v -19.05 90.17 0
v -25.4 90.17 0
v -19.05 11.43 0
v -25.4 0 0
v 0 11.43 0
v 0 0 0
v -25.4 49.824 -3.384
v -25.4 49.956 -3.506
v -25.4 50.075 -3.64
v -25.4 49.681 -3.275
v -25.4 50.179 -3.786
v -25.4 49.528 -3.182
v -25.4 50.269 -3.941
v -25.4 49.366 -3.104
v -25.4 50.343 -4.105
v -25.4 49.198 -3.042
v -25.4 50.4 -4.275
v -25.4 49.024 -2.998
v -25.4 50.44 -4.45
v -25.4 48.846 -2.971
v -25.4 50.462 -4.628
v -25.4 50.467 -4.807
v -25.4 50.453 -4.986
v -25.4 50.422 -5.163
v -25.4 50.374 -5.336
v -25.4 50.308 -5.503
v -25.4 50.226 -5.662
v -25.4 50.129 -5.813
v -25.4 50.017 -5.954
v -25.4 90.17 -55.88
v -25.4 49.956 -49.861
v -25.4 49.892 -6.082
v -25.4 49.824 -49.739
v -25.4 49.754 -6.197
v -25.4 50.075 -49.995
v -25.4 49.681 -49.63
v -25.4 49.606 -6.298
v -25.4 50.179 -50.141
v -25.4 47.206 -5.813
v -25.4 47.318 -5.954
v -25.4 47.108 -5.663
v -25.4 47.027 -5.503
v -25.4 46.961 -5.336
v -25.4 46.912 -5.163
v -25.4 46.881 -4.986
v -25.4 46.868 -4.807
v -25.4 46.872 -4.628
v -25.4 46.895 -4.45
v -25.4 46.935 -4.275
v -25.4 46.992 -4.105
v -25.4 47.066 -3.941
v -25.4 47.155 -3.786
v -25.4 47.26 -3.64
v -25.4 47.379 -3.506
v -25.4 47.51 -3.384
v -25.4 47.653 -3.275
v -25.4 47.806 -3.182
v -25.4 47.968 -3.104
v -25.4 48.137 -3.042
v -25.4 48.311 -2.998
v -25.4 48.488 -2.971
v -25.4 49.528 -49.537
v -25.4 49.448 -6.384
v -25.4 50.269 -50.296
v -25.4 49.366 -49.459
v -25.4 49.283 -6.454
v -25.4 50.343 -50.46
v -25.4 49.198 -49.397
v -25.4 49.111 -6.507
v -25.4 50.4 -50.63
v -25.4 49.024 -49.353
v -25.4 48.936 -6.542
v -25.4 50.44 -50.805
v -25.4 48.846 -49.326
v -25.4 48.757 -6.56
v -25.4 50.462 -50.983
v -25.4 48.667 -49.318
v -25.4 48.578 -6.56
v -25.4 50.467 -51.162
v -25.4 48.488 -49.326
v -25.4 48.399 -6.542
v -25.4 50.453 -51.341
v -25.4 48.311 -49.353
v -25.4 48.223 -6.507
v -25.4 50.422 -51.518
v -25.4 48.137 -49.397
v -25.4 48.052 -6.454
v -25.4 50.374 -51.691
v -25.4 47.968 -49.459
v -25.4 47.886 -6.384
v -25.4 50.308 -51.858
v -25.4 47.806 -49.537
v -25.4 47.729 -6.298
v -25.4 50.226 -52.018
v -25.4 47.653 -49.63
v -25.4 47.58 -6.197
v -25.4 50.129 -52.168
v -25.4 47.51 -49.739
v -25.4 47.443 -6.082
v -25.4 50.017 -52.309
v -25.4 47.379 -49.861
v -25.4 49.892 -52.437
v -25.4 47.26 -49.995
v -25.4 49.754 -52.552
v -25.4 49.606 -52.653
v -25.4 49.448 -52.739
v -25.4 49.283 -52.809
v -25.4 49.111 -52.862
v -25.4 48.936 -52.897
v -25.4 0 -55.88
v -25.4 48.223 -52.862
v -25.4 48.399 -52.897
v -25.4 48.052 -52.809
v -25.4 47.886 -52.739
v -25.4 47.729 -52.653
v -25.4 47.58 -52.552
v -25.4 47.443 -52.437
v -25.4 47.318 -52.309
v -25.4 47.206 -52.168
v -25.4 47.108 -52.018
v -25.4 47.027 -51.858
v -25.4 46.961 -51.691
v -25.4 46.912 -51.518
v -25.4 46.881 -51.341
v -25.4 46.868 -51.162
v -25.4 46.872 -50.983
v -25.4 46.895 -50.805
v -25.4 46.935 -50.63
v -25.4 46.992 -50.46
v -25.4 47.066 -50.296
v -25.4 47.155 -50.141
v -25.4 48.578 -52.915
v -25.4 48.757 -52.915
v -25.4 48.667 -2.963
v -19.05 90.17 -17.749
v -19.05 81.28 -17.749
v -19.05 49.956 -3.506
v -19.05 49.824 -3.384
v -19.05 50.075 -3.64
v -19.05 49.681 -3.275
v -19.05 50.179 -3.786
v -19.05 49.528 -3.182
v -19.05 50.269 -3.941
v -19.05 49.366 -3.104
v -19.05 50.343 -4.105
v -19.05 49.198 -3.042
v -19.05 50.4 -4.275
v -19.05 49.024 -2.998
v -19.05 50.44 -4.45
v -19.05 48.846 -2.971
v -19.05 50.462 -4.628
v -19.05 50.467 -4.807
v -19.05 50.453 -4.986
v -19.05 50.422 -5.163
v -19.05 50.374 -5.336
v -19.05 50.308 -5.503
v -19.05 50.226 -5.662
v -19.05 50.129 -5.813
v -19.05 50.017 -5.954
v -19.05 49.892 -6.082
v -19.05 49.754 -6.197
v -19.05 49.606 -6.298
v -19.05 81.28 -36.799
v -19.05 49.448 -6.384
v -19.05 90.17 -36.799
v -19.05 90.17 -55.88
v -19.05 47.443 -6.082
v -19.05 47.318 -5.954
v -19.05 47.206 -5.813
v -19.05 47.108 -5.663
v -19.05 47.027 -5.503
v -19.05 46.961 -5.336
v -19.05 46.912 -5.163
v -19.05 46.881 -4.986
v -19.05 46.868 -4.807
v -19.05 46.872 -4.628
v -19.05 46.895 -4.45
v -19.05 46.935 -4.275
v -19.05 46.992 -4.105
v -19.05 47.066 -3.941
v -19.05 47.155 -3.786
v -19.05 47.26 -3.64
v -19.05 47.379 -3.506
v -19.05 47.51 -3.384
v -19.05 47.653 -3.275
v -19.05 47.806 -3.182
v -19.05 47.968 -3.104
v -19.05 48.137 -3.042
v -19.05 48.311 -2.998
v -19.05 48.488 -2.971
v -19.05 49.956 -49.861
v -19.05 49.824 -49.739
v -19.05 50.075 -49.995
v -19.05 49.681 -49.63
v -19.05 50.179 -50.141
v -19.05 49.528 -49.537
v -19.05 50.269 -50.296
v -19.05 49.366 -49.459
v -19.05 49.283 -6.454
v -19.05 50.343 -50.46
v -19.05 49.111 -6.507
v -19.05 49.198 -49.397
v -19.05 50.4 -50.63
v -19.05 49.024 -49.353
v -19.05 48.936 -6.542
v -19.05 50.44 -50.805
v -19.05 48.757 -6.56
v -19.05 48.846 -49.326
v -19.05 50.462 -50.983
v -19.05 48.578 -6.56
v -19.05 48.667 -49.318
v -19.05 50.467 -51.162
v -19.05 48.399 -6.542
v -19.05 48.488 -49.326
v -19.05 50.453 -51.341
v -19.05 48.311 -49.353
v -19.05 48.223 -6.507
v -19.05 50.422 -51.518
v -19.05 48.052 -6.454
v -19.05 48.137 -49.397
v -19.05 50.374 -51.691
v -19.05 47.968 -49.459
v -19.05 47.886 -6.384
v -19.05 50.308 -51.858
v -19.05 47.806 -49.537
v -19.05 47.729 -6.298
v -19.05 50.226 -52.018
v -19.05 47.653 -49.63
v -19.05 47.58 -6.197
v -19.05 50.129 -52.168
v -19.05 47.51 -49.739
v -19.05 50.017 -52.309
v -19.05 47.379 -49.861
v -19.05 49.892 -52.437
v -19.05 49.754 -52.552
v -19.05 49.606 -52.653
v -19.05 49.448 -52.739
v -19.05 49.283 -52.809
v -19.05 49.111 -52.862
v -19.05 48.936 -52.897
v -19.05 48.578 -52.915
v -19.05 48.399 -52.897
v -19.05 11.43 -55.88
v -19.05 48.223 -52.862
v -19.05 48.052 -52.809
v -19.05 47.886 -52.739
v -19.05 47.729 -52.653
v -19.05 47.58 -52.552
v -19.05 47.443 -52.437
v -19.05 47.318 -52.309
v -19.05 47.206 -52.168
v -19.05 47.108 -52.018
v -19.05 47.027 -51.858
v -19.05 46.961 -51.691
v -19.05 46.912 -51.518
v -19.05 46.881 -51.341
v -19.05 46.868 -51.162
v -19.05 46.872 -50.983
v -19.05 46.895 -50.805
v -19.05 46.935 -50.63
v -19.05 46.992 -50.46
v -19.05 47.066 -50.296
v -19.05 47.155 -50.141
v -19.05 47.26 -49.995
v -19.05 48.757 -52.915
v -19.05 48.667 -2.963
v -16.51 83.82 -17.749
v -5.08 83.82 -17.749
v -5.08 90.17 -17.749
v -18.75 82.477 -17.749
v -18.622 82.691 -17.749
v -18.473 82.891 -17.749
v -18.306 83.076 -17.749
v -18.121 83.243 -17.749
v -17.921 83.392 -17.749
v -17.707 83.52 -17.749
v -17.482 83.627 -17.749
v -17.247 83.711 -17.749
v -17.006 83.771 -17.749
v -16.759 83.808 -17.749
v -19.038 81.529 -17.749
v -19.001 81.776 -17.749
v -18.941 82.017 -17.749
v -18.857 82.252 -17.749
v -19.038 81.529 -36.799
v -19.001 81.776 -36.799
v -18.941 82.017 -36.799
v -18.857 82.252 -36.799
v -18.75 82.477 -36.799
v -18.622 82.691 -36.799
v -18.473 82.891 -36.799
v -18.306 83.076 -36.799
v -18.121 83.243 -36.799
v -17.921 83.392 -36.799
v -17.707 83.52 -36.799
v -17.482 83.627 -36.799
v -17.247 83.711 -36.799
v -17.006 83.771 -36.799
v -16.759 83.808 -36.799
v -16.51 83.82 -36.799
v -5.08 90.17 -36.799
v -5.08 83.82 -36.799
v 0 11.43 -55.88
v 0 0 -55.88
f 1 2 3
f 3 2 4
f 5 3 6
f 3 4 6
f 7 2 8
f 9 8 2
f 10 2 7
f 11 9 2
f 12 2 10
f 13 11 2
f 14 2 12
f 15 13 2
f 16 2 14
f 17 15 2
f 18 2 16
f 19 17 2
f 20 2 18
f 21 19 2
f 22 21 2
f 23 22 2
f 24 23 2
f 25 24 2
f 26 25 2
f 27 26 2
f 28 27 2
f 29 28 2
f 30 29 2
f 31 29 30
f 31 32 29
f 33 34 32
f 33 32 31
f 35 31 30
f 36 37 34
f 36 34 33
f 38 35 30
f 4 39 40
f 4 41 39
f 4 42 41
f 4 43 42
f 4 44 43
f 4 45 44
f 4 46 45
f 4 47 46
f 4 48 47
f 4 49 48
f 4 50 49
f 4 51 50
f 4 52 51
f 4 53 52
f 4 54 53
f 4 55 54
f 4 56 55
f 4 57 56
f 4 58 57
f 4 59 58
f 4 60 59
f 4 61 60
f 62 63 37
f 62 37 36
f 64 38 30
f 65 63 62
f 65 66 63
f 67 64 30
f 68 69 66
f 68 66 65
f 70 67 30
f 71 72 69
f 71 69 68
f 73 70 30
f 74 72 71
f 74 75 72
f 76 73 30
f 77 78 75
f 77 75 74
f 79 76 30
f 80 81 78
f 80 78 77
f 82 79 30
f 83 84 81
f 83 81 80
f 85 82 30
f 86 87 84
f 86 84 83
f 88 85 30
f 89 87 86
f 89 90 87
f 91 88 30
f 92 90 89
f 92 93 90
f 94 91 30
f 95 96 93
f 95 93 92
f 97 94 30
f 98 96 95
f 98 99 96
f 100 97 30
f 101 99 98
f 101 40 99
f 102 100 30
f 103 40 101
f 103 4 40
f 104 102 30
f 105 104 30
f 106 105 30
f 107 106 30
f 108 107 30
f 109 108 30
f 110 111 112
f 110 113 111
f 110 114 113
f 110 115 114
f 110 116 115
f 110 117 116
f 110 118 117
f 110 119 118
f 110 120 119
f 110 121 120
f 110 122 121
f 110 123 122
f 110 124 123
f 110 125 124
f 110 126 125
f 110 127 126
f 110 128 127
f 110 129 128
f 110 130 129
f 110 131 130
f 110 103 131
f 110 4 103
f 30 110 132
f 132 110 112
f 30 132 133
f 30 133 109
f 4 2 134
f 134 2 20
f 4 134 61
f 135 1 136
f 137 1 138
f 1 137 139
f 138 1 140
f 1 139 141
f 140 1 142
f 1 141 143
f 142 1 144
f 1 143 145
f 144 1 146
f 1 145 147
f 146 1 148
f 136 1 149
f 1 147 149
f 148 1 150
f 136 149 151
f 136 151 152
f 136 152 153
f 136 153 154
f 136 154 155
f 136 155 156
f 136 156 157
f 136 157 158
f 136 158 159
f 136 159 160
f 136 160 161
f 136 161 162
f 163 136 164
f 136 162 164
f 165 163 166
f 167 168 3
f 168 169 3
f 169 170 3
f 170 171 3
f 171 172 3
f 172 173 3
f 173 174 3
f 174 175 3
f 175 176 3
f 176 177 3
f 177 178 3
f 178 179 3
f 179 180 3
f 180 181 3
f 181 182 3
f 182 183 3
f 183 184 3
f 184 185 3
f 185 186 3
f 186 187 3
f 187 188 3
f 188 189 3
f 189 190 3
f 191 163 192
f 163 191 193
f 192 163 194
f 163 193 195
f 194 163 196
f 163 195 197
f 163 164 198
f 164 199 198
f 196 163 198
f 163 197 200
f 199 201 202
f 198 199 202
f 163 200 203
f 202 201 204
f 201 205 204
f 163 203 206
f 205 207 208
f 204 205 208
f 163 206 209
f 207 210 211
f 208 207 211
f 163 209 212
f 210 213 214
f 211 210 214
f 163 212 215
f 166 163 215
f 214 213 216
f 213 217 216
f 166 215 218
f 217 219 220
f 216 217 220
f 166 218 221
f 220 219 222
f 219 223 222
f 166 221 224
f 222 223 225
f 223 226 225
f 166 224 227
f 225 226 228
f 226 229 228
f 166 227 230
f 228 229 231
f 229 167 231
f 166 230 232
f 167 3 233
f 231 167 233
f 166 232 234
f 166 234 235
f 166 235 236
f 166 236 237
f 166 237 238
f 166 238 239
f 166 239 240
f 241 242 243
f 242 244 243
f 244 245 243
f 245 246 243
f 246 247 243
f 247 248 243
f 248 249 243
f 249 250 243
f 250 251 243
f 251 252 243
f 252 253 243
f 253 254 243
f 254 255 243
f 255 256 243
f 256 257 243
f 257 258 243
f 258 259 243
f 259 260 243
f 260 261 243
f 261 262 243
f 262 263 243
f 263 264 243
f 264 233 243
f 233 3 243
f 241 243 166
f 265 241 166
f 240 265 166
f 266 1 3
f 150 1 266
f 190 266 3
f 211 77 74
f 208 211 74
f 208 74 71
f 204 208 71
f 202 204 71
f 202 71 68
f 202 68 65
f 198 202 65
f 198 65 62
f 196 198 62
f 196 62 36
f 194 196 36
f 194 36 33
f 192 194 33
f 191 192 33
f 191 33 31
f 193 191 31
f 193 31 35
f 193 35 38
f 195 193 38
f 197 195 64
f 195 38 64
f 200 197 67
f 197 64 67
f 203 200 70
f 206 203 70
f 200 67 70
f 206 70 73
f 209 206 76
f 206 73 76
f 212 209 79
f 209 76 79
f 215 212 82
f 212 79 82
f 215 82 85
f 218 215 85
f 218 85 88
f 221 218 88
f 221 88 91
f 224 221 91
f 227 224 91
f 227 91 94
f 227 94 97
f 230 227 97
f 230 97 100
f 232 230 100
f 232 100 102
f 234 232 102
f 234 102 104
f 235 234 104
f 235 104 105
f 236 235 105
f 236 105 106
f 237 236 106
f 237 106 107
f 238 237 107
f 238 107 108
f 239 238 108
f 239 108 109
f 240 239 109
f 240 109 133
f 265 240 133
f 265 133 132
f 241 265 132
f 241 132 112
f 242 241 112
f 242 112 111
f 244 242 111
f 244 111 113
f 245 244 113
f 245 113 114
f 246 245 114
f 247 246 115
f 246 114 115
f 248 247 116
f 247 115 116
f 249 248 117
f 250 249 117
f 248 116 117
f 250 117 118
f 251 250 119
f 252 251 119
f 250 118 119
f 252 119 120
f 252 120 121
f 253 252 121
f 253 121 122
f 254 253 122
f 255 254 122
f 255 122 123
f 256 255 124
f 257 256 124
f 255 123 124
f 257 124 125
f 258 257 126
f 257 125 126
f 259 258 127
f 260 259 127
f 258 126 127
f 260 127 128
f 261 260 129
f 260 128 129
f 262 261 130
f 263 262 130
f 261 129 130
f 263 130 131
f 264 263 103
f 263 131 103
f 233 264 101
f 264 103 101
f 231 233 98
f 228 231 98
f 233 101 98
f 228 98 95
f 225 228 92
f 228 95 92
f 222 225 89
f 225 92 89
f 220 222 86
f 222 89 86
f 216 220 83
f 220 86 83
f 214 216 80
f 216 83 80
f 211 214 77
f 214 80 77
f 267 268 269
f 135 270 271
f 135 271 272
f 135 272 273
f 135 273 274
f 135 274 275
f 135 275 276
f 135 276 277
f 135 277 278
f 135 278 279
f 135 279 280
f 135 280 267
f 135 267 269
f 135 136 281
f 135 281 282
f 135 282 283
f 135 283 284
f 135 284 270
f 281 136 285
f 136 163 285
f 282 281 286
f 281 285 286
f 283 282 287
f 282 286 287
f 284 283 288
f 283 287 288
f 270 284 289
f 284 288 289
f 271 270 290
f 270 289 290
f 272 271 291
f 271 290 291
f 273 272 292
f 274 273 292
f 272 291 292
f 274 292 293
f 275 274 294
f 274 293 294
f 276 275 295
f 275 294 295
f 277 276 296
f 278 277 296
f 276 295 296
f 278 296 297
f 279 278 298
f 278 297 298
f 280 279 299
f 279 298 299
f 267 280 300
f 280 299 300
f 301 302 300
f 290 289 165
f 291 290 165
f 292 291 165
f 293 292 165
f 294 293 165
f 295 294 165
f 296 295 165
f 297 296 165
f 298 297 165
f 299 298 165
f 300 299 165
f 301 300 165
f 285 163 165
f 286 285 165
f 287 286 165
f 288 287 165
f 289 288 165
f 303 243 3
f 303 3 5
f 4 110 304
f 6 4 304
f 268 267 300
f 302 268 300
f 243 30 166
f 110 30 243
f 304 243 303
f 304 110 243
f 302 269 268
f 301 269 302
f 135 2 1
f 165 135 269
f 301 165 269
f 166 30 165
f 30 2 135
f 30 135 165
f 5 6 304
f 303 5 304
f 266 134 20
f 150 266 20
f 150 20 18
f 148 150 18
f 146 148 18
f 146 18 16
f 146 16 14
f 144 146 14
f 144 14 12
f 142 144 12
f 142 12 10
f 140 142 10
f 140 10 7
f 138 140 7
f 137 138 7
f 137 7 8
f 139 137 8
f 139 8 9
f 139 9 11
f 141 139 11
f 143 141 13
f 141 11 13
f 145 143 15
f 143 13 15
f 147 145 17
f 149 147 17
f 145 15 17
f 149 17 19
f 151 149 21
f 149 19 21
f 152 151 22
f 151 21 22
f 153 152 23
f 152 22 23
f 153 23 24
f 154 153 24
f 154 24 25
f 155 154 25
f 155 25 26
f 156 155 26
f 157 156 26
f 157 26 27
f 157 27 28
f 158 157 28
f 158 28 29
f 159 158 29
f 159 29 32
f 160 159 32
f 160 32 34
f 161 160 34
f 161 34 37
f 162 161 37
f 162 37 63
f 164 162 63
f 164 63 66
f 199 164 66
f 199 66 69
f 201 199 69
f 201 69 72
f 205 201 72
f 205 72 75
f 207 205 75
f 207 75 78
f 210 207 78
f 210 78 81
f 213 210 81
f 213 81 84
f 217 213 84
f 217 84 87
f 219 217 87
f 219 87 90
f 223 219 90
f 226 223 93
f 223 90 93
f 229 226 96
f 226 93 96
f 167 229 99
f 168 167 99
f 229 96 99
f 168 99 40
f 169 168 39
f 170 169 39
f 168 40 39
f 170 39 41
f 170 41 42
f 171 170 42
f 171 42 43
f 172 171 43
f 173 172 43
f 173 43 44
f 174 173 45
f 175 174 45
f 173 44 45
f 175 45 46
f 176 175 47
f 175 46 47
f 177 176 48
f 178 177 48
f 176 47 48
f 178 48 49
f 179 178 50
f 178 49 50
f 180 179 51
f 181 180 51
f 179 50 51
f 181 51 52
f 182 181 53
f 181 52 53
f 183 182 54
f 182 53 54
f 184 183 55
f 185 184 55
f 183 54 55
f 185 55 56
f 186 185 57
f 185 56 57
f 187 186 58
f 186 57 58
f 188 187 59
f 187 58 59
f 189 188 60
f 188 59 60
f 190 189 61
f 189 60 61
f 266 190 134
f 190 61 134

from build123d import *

# Parameters (mm, degrees)
SKETCH1_W            = 25.4
SKETCH1_H            = 55.88
BOSS_EXTRUDE1_DEPTH  = 11.43
SKETCH3_W            = 6.35
SKETCH3_H            = 55.88
BOSS_EXTRUDE2_DEPTH  = 78.74
SKETCH4_W            = 19.05
SKETCH4_H            = 6.35
BOSS_EXTRUDE3_DEPTH  = 13.97
M3_CLEARANCE_HOLE1_D = 3.6
FILLET1_R            = 2.54


with BuildPart() as part:
    # Sketch1 → Boss-Extrude1 (new body)
    with BuildSketch(Plane(origin=(0, 0, 0), x_dir=(1, 0, 0), z_dir=(0, 1, 0))):
        with Locations((-12.7, 27.94)):
            Rectangle(SKETCH1_W, SKETCH1_H)
    extrude(amount=BOSS_EXTRUDE1_DEPTH)

    # Sketch3 → Boss-Extrude2 (add)
    with BuildSketch(Plane(origin=(0, 11.43, 0), x_dir=(1, 0, 0), z_dir=(0, 1, 0))):
        with Locations((-22.225, 27.94)):
            Rectangle(SKETCH3_W, SKETCH3_H)
    extrude(amount=BOSS_EXTRUDE2_DEPTH)

    # Sketch4 → Boss-Extrude3 (add)
    with BuildSketch(Plane(origin=(-19.05, 0, 0), x_dir=(0, 0, -1), z_dir=(1, 0, 0))):
        with Locations((27.274464597, 86.995)):
            Rectangle(SKETCH4_W, SKETCH4_H)
    extrude(amount=BOSS_EXTRUDE3_DEPTH)

    # M3 Clearance Hole1 (through all)
    with Locations(Plane(origin=(-19.05, 0, 0), x_dir=(0, 0, -1), z_dir=(1, 0, 0))):
        with Locations((4.7625, 48.667276481), (51.1175, 48.667276481)):
            Hole(M3_CLEARANCE_HOLE1_D / 2)

    # Fillet1
    fillet1_edges = [part.edges().sort_by_distance(p)[0] for p in [
        (-19.05, 83.82, -27.274464597),
    ]]
    fillet(fillet1_edges, radius=FILLET1_R)


solid = part.part
